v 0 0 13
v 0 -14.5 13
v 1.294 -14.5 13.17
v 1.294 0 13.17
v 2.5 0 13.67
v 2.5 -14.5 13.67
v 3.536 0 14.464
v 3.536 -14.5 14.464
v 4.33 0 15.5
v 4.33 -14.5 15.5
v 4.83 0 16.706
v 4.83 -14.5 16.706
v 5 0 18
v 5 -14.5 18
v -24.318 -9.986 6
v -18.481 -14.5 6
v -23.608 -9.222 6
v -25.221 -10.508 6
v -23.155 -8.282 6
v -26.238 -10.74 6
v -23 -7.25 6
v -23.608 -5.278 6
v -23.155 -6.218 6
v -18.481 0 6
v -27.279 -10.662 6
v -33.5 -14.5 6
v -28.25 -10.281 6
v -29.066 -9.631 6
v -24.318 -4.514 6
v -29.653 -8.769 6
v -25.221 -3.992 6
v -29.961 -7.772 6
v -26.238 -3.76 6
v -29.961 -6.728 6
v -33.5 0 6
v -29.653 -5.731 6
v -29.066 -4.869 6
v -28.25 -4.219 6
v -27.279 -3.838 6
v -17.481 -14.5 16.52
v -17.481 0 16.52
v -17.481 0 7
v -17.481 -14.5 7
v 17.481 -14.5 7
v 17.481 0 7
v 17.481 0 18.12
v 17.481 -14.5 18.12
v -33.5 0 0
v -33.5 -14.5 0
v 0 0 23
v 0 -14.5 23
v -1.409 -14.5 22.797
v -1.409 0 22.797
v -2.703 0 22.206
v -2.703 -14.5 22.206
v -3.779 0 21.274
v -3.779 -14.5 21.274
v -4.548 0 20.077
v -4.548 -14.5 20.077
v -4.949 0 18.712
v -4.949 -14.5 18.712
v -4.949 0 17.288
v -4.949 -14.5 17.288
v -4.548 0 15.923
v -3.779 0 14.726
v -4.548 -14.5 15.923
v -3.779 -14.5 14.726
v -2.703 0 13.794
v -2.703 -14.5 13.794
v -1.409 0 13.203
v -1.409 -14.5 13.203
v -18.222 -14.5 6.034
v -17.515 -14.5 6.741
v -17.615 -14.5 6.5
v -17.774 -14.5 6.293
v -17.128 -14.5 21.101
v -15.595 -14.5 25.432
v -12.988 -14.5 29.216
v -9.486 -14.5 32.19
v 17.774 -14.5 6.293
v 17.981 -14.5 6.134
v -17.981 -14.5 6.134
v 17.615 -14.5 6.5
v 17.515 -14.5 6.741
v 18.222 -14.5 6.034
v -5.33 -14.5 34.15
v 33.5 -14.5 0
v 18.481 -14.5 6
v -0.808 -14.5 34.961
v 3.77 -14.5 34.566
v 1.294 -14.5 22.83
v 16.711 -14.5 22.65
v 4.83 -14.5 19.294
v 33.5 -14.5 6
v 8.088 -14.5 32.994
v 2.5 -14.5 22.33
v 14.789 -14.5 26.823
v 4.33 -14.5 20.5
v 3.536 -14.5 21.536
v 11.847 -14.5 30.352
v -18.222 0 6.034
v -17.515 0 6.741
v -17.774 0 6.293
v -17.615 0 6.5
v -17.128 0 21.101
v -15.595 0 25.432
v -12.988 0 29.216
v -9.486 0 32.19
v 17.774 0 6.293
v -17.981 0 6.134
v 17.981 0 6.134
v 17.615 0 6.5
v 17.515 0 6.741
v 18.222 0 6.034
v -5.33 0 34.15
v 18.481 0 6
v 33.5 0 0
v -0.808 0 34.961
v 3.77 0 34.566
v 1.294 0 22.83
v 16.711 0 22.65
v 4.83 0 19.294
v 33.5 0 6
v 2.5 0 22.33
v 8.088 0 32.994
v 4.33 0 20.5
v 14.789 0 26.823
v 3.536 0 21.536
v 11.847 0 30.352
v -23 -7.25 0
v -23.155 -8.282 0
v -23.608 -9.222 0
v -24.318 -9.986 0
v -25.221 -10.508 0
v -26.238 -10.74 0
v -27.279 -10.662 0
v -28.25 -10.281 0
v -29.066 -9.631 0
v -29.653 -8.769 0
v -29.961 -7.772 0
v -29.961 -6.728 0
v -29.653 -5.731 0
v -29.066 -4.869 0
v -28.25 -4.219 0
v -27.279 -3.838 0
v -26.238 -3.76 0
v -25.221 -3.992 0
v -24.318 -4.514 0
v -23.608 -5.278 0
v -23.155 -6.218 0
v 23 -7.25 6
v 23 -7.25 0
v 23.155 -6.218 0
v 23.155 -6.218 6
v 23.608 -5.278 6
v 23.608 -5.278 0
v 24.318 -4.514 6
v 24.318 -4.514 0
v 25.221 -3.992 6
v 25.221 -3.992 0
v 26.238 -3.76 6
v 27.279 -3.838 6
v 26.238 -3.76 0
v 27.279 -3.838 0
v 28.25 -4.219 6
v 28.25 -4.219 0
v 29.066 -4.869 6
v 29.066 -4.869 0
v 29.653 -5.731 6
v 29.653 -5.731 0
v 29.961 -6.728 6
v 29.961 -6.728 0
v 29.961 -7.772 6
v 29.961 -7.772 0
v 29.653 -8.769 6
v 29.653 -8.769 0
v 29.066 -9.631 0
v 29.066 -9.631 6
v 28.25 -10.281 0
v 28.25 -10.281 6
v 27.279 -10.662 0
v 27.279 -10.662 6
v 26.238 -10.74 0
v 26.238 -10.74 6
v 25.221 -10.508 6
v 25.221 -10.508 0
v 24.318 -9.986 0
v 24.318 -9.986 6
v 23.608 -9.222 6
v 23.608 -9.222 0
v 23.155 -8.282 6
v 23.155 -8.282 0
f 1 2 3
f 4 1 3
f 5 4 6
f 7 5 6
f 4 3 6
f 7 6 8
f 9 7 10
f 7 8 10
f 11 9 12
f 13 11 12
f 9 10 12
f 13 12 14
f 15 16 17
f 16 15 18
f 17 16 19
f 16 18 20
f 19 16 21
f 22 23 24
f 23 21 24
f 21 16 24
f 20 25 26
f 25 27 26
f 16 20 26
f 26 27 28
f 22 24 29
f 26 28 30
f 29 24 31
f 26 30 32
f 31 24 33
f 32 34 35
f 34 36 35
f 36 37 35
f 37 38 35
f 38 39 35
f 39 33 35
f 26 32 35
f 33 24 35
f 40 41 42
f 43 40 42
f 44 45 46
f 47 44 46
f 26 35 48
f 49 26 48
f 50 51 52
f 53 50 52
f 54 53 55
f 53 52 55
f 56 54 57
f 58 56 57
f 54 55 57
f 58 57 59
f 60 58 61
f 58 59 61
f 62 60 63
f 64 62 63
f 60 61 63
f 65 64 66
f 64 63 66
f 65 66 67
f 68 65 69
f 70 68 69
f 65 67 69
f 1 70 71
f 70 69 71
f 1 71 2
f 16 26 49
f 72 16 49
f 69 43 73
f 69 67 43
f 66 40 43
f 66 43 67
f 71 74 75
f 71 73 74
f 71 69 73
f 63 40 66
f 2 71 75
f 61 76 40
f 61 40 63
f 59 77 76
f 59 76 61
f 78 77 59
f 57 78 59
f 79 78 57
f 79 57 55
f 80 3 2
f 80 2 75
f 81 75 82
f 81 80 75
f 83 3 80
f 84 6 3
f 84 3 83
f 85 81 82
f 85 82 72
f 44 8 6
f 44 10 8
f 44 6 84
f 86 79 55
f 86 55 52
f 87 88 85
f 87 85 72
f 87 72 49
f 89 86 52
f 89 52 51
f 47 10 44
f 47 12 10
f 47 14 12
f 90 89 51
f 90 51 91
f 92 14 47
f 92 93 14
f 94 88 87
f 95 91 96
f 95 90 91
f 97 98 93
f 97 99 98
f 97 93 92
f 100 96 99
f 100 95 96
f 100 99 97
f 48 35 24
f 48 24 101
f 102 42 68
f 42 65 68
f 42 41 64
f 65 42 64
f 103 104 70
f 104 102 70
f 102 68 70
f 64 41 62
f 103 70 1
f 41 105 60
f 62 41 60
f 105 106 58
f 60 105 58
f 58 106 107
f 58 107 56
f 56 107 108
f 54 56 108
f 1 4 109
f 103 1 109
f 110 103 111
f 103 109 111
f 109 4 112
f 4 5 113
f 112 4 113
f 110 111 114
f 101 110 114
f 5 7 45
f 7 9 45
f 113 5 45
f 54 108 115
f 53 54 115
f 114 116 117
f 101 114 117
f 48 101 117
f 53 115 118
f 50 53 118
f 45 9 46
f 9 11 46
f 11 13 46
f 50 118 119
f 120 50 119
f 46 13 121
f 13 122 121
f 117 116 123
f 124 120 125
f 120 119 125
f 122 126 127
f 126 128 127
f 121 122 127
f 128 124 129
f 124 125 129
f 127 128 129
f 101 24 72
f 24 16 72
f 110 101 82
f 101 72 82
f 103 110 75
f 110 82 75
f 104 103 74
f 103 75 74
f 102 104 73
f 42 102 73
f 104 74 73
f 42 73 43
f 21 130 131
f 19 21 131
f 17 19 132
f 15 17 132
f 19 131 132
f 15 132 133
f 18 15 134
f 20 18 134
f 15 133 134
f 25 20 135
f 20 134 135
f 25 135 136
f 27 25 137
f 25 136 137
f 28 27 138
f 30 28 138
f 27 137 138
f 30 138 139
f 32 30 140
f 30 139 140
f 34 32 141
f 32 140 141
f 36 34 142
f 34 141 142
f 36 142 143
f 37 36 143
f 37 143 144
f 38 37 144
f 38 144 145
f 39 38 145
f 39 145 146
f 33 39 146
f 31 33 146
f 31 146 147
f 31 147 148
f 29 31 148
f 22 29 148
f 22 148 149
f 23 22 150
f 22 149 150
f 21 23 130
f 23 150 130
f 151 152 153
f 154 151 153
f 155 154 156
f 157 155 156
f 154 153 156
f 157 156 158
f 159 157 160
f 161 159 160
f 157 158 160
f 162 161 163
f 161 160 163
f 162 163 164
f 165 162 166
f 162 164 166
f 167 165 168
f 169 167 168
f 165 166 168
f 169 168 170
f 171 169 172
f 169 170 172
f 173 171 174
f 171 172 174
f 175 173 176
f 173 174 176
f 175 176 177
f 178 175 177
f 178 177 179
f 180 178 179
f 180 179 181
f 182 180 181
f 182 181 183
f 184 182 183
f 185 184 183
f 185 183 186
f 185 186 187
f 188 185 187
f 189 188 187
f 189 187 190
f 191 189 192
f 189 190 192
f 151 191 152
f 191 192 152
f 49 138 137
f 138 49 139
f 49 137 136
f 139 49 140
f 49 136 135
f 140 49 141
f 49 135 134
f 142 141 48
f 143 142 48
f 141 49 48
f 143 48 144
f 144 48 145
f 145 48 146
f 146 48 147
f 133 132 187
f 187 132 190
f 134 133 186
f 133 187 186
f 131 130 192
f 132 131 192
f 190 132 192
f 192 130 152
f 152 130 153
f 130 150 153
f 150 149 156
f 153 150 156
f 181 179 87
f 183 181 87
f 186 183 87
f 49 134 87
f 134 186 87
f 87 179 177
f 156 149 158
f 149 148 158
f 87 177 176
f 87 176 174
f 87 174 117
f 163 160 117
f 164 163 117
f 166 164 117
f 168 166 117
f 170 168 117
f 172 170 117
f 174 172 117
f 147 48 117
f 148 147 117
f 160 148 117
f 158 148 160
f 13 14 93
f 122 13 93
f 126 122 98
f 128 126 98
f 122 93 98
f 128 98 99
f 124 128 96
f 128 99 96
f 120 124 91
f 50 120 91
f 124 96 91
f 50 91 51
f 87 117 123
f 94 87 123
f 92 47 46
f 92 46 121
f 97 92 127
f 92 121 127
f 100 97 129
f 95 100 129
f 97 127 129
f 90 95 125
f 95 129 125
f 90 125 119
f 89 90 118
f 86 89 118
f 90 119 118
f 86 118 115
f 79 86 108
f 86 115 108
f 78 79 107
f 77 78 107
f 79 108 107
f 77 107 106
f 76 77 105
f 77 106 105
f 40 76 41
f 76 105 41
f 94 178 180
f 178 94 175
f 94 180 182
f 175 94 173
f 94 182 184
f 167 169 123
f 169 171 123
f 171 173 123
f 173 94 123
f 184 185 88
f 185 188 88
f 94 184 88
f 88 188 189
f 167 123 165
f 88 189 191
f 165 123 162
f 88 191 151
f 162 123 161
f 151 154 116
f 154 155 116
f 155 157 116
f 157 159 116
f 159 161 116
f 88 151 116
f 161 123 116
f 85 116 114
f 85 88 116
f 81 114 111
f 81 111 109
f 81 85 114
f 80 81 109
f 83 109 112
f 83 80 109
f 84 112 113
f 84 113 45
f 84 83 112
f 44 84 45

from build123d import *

# Parameters (mm, degrees)
F1_DEPTH = 14.5
F3_DEPTH = 14.5
F4_R     = 1
F5_R     = 3.5
F6_DEPTH = 6


with BuildPart() as f1:
    # F0 (on Front) → F1 (new body)
    with BuildSketch(Plane.XZ):
        with BuildLine():
            Line((-33.5, 0), (-0.8672476206, 0))
            Line((-0.8672476206, 0), (0, 0))
            Line((0, 0), (0.8527118365, 0))
            Line((0.8527118365, 0), (33.5, 0))
            Line((33.5, 0), (33.5, 6))
            Line((33.5, 6), (17.4809702634, 6))
            Line((17.4809702634, 6), (17.4809702634, 16.8373537033))
            Line((17.4809702634, 16.8373537033), (17.4809702634, 18.120359887))
            ThreePointArc((17.4809702634, 18.120359887), (-0.8075640242, 34.9605479634), (-17.4809702634, 16.5198336275))
            Line((-17.4809702634, 16.5198336275), (-17.4809702634, 6))
            Line((-17.4809702634, 6), (-33.5, 6))
            Line((-33.5, 6), (-33.5, 0))
        make_face()
    extrude(amount=F1_DEPTH)

    # F2 (on face) → F3 (cut, through all)
    with BuildSketch(Plane.XZ.offset(14.5)):
        with BuildLine():
            ThreePointArc((0, 23), (-5, 18), (0, 13))
            Line((0, 13), (0, 23))
        make_face()
        with BuildLine():
            Line((0, 23), (0, 13))
            ThreePointArc((0, 13), (3.5355339059, 14.4644660941), (5, 18))
            ThreePointArc((5, 18), (3.5355339059, 21.5355339059), (0, 23))
        make_face()
    extrude(amount=-F3_DEPTH, mode=Mode.SUBTRACT)

    # F4
    f4_edges = [f1.edges().sort_by_distance(p)[0] for p in [
        (-17.48097, -7.25, 6),
        (17.48097, -7.25, 6),
    ]]
    fillet(f4_edges, radius=F4_R)

    # F5 (on face) → F6 (cut, through all)
    with BuildSketch(Plane(origin=(0, 0, 0), x_dir=(1, 0, 0), z_dir=(0, 0, -1))):
        with BuildLine():
            Line((23, 7.25), (30, 7.25))
            ThreePointArc((30, 7.25), (26.5, 10.75), (23, 7.25))
        make_face()
        with BuildLine():
            ThreePointArc((23, 7.25), (26.5, 3.75), (30, 7.25))
            Line((30, 7.25), (23, 7.25))
        make_face()
        with Locations((-26.5, 7.25)):
            Circle(F5_R)
    extrude(amount=-F6_DEPTH, mode=Mode.SUBTRACT)


solid = f1.part
